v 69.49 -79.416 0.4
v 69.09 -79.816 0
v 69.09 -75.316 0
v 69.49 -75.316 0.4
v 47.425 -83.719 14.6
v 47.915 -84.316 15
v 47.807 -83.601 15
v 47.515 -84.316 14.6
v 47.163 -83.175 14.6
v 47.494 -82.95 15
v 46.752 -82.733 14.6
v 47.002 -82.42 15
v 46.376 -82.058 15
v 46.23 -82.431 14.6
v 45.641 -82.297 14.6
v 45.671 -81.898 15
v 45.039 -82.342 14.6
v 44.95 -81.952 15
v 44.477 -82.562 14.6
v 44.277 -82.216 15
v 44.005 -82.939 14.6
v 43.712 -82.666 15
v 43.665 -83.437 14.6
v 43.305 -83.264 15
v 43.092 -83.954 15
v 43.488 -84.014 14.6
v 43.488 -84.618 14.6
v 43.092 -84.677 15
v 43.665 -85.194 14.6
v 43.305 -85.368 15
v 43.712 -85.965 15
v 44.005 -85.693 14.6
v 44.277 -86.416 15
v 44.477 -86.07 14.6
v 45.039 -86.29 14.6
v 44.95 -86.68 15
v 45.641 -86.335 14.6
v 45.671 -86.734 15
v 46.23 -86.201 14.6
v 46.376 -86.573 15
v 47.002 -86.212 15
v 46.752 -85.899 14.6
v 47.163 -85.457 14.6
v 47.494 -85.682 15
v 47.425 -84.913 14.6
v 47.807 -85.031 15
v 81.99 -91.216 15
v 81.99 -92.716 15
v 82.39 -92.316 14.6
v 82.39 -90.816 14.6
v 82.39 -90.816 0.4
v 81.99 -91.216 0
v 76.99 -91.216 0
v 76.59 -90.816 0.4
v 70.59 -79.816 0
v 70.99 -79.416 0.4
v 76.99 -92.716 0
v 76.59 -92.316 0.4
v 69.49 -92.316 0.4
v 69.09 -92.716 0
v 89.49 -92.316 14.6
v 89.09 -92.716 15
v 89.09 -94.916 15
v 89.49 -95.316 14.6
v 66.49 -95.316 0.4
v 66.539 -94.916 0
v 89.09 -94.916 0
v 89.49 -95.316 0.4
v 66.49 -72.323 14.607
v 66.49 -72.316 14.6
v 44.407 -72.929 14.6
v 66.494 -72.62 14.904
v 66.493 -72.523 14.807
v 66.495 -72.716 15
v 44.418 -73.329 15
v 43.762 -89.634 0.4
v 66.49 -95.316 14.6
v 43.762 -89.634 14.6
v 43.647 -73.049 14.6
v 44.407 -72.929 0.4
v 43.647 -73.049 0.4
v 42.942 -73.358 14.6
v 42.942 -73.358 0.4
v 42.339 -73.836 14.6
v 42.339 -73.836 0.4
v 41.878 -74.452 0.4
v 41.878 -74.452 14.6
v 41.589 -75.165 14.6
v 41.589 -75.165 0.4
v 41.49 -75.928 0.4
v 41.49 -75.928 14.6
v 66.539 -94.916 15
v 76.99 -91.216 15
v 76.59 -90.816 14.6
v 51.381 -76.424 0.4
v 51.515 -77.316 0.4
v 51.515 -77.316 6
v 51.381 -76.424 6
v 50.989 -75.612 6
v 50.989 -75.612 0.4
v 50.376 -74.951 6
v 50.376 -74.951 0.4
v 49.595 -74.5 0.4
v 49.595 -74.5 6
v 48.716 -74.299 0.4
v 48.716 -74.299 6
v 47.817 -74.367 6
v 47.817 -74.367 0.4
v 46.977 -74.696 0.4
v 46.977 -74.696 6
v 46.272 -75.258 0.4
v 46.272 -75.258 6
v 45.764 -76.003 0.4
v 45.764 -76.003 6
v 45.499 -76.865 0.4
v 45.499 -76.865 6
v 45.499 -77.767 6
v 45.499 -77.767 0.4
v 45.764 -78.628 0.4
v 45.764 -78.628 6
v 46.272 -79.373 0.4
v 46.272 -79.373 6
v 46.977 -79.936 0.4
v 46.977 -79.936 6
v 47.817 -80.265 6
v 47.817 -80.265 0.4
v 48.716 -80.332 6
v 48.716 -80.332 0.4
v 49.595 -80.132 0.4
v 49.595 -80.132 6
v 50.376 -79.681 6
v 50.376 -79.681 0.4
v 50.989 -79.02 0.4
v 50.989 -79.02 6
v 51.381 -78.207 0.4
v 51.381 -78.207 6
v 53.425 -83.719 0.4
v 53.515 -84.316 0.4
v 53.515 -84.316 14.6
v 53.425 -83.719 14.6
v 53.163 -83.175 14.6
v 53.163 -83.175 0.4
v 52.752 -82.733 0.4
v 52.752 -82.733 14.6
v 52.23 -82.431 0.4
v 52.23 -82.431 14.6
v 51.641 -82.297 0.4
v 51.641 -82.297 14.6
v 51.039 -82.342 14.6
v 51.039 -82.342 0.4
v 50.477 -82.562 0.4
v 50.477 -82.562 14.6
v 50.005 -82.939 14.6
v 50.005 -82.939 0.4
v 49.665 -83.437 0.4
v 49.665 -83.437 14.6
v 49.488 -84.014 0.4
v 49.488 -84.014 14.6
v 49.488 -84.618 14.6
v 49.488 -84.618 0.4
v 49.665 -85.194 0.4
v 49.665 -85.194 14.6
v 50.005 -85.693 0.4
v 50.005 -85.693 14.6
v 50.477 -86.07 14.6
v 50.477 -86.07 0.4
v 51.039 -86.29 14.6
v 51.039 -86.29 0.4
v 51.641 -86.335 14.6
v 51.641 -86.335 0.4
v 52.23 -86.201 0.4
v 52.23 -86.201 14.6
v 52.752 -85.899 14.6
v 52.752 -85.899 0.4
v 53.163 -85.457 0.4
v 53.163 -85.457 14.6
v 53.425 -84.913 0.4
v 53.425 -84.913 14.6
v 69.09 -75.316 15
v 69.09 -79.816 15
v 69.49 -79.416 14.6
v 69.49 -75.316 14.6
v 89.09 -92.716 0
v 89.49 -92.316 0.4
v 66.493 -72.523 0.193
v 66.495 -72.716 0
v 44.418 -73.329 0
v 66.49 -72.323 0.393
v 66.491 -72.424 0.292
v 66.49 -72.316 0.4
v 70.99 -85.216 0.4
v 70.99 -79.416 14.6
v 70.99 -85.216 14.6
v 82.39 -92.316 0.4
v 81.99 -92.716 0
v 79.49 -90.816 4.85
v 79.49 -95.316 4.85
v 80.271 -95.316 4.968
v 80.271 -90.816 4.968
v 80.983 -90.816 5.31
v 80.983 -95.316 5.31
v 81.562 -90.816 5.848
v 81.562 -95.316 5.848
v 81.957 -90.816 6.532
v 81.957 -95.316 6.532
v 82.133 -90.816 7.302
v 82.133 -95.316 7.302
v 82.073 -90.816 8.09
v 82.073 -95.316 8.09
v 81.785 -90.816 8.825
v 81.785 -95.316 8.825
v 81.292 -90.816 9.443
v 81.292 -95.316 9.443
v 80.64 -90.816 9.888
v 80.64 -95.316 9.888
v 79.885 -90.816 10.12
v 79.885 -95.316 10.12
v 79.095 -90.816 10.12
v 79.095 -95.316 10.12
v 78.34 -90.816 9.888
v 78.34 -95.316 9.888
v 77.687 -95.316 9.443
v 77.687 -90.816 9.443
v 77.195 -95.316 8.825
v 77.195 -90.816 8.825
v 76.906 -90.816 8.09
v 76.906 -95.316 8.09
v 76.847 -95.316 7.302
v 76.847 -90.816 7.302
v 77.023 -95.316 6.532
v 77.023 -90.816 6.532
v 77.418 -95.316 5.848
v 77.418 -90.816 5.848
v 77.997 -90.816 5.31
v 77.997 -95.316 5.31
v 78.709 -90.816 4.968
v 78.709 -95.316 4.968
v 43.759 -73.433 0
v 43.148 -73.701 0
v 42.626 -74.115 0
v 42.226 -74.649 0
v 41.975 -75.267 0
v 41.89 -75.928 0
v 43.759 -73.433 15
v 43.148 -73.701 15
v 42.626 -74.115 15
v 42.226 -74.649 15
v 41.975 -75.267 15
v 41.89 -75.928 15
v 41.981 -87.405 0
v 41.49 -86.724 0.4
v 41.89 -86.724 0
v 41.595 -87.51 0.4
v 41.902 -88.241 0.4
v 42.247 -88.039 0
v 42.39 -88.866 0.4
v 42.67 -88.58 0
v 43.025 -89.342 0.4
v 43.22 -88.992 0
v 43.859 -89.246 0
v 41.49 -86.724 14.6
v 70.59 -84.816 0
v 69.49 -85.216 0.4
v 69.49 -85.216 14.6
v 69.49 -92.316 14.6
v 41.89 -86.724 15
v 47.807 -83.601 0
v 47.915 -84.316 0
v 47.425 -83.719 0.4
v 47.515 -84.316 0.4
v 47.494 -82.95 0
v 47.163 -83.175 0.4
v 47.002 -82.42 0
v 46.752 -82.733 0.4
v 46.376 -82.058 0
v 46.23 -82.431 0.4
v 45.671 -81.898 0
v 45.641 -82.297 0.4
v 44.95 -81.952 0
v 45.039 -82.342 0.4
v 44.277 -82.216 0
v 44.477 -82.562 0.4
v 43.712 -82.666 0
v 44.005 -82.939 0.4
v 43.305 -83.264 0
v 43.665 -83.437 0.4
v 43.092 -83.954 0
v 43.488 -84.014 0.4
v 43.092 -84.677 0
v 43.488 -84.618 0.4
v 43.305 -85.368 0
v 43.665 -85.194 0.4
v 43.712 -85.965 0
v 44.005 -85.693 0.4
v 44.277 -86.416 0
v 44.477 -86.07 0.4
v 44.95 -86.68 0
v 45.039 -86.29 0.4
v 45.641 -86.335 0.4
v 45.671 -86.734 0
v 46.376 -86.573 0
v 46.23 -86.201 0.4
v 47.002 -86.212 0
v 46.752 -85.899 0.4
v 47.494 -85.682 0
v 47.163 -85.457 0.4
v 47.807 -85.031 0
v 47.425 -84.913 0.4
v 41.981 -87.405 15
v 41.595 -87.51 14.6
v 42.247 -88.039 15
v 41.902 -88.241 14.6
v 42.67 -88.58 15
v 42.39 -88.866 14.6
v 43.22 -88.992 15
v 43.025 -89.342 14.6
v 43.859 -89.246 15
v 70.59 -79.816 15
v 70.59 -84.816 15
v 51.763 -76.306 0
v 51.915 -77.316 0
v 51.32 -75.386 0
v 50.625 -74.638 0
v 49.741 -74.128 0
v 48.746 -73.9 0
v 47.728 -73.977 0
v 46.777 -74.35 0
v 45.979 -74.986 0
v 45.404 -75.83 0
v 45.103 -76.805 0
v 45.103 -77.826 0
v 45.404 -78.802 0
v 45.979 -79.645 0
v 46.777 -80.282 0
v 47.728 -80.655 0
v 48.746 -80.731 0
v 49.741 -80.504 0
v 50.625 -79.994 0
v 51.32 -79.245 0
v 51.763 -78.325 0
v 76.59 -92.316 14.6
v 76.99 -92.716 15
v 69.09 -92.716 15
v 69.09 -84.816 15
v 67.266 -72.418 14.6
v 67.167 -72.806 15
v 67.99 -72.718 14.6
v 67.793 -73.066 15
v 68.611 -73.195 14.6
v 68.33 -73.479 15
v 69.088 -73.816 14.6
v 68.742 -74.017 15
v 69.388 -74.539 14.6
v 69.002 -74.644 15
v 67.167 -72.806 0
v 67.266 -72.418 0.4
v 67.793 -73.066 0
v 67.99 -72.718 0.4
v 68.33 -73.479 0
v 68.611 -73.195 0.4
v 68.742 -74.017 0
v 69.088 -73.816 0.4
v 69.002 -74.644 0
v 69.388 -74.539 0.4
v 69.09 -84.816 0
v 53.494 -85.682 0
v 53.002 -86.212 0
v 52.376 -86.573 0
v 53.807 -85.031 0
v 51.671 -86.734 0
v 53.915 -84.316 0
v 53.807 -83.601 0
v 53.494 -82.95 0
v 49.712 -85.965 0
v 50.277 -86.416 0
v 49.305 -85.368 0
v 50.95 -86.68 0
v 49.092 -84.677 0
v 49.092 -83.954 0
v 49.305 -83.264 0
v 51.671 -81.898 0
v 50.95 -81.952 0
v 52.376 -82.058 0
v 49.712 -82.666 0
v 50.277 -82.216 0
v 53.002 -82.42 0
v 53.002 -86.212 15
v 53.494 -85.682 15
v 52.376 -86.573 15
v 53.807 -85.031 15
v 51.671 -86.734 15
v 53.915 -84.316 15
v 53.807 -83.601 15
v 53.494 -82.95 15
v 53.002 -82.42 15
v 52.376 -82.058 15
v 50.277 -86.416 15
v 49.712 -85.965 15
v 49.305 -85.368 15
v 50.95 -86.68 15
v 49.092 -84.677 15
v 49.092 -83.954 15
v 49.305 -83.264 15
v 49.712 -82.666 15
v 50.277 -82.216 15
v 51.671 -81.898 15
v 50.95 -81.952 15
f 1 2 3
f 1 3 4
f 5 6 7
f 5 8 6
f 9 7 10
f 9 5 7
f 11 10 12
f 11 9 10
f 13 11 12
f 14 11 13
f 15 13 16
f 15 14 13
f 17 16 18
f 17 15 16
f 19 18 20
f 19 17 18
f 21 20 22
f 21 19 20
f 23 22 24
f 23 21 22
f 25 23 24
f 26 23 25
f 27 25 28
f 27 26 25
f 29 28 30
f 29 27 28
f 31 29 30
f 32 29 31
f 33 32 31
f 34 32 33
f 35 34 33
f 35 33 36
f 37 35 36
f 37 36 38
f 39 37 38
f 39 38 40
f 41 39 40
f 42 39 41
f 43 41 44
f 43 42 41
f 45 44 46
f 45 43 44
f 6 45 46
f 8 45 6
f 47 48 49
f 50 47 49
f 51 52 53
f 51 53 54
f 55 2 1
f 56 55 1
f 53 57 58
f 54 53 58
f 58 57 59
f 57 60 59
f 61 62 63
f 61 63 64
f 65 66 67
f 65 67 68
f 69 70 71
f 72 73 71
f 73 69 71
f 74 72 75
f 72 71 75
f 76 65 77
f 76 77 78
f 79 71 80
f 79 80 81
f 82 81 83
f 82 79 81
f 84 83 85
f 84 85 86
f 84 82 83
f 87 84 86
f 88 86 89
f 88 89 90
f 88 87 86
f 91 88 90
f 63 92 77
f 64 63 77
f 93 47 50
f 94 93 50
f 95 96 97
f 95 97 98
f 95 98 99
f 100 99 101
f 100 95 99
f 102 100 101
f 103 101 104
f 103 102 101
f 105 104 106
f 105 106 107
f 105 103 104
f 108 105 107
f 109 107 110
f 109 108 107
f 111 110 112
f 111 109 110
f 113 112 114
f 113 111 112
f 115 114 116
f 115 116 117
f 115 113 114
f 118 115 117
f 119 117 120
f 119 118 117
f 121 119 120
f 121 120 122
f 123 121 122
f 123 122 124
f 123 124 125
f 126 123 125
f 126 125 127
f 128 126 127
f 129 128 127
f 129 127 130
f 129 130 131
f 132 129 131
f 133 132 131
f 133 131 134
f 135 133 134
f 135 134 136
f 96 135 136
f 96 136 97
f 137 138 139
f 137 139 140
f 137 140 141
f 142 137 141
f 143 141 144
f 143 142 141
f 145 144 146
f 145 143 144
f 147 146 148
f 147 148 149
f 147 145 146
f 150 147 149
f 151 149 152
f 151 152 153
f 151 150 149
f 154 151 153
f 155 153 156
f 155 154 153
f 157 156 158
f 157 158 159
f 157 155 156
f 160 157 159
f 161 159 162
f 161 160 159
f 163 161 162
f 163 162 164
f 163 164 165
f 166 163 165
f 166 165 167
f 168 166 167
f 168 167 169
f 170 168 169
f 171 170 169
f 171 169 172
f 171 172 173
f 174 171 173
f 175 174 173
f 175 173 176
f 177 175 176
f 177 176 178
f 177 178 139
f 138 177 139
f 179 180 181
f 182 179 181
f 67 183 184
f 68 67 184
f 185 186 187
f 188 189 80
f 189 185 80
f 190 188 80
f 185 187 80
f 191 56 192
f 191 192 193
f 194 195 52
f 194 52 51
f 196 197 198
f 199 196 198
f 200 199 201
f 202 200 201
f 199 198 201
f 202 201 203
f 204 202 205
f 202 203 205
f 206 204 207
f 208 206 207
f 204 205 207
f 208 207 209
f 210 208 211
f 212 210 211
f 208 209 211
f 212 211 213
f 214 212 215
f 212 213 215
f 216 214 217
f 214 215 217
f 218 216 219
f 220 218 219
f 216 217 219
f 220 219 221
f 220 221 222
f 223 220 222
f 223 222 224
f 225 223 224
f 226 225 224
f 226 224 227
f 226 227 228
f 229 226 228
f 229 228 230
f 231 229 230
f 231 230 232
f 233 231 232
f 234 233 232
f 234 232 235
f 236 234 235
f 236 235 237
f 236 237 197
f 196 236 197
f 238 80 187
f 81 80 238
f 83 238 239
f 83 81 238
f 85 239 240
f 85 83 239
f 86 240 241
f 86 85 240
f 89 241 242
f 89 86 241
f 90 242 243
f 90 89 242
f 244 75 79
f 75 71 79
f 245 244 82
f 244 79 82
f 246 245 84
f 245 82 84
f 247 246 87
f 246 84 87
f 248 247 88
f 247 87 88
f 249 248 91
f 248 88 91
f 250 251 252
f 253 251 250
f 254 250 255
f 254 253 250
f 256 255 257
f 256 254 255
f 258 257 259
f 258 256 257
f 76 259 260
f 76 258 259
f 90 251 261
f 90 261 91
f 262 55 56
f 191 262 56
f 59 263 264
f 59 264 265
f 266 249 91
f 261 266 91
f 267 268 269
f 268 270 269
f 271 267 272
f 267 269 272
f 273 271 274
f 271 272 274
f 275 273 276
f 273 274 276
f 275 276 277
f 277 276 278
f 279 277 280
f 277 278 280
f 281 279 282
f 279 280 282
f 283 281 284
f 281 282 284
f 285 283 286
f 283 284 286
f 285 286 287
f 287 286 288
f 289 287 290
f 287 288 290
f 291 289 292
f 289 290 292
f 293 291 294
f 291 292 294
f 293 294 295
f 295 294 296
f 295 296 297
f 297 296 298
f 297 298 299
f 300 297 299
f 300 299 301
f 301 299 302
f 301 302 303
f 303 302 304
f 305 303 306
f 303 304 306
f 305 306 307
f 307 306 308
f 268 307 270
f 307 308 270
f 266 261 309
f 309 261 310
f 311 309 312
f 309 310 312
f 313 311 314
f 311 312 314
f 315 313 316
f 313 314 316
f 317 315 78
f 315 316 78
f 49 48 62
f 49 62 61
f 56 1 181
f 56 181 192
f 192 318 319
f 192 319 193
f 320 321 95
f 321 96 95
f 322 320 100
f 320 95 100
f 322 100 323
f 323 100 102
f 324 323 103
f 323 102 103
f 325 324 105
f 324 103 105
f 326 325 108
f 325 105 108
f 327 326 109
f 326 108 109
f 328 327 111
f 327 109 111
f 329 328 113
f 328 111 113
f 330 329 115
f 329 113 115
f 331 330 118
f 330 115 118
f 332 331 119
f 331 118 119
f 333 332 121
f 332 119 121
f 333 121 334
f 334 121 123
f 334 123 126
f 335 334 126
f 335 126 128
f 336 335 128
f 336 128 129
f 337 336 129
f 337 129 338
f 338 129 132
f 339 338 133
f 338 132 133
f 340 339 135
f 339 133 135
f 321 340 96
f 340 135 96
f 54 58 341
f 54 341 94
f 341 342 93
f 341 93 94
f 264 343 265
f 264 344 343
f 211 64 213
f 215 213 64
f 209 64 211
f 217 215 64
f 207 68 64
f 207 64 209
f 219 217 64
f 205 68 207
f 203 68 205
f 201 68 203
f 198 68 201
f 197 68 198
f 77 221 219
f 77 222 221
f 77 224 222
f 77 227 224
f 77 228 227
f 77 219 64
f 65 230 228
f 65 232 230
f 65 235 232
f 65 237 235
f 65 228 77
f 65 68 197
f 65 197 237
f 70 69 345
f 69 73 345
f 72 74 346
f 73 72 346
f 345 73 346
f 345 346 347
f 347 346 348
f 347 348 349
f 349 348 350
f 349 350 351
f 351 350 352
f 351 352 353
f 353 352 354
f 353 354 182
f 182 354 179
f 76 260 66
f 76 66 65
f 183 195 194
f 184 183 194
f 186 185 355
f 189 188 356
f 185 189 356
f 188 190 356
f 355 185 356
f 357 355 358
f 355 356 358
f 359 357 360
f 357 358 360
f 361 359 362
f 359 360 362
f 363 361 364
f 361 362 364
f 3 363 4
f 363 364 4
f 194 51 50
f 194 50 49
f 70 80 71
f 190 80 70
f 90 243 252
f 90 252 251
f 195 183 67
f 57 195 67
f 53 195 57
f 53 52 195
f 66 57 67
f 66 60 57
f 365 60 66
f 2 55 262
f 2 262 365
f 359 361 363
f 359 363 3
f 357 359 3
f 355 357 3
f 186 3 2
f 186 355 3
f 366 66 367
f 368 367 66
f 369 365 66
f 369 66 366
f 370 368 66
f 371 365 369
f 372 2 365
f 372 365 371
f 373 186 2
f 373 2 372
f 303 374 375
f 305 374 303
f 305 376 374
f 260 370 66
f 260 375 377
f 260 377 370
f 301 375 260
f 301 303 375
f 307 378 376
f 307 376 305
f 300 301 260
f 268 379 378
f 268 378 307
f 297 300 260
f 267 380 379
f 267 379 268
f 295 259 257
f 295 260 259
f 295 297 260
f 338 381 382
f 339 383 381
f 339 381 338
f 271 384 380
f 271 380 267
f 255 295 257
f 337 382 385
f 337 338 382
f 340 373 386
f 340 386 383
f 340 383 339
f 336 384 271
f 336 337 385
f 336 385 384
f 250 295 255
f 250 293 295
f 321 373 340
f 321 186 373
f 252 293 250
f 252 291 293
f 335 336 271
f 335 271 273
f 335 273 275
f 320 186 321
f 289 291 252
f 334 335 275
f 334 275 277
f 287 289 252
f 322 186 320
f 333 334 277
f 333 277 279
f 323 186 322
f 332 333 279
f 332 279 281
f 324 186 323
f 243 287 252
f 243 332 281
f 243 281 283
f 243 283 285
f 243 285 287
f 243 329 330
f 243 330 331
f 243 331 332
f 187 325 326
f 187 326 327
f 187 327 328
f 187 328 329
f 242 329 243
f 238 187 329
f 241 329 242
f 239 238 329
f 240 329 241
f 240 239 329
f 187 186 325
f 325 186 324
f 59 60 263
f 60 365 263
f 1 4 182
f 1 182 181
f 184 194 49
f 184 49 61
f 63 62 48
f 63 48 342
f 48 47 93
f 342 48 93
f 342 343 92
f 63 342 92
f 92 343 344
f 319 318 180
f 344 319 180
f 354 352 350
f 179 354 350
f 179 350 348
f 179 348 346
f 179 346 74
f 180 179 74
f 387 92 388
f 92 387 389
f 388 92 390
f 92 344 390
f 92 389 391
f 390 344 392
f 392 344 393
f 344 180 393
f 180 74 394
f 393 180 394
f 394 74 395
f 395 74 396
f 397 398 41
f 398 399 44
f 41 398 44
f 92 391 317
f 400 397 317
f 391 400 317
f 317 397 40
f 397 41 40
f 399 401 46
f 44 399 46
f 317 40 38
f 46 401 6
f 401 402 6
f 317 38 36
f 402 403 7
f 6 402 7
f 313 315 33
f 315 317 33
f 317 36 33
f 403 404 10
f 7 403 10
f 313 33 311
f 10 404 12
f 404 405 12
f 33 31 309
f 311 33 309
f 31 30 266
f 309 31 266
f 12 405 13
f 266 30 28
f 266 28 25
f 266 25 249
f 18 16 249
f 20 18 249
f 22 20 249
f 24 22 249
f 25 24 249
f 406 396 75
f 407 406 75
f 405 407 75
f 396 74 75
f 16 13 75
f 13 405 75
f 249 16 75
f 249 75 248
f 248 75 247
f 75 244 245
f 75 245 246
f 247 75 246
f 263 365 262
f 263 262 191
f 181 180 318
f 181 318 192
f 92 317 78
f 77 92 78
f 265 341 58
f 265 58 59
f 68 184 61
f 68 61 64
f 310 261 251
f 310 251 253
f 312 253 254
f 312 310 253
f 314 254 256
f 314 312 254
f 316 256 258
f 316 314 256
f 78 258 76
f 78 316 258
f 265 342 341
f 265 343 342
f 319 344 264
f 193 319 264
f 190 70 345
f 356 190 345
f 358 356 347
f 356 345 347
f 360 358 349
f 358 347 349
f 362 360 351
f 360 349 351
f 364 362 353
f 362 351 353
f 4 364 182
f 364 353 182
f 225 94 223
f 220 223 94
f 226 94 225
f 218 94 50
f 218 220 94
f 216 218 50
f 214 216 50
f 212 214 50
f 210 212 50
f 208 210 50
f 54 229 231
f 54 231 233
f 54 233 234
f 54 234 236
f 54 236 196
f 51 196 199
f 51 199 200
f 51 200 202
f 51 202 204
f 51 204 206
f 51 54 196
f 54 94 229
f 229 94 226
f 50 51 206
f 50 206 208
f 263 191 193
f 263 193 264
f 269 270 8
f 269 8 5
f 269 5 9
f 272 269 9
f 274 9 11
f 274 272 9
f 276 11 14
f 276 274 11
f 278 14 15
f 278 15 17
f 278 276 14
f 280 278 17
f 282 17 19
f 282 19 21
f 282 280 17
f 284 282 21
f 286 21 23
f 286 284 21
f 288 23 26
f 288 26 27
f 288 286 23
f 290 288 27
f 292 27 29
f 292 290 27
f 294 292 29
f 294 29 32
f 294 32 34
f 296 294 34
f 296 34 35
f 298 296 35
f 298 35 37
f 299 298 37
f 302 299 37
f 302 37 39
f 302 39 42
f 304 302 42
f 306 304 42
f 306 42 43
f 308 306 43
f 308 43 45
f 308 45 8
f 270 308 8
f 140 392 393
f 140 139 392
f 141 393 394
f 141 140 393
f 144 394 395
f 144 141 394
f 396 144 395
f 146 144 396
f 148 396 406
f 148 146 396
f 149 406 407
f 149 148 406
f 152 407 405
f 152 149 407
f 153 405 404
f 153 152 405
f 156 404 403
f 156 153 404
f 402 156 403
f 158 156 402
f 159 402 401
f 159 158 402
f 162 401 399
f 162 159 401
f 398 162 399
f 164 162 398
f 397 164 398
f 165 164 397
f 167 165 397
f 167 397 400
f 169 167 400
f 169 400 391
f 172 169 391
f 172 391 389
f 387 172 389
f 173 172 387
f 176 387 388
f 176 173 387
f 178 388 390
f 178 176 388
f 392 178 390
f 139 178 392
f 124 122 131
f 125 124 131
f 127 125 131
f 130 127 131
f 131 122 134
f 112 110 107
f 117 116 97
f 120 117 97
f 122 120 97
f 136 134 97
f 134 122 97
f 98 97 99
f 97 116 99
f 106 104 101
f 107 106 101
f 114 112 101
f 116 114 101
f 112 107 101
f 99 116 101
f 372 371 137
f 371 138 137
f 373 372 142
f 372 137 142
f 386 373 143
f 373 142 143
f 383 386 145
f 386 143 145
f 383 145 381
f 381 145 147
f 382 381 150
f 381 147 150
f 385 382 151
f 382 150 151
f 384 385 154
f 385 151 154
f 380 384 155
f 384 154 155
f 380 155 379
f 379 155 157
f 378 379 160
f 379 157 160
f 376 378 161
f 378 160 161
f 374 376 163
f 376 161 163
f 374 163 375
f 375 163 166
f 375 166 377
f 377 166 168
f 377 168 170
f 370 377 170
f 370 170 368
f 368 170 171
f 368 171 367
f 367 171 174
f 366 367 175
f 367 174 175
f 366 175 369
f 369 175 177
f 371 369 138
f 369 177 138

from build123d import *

# Parameters (mm, degrees)
SKETCH1_R           = 3.025
SKETCH1_R_2         = 2.025
BOSS_EXTRUDE1_DEPTH = 15
BOSS_EXTRUDE2_START = 6
SKETCH1_2_R         = 3.025
BOSS_EXTRUDE2_DEPTH = 9
SKETCH2_R           = 2.65
CUT_EXTRUDE1_DEPTH  = 70
FILLET1_R           = 3
CHAMFER1_SIZE       = 0.4


# Some blends are built 0.0001 mm under size
with BuildPart() as part:
    # Sketch1 → Boss-Extrude1 (new body)
    with BuildSketch(Plane.XY):
        Polygon((66.489922843, -72.31585339), (69.489922843, -72.31585339), (69.489922843, -79.41585339), (70.989922843, -79.41585339), (70.989922843, -85.21585339), (69.489922843, -85.21585339), (69.489922843, -92.31585339), (76.589922843, -92.31585339), (76.589922843, -90.81585339), (82.389922843, -90.81585339), (82.389922843, -92.31585339), (89.489922843, -92.31585339), (89.489922843, -95.31585339), (66.489922843, -95.31585339), (41.489922843, -89.06585339), (41.489922843, -73.010297834), align=None)
        with Locations((48.489922843, -77.31585339)):
            Circle(SKETCH1_R, mode=Mode.SUBTRACT)
        with Locations((45.489922843, -84.31585339)):
            Circle(SKETCH1_R_2, mode=Mode.SUBTRACT)
        with Locations((51.489922843, -84.31585339)):
            Circle(SKETCH1_R_2, mode=Mode.SUBTRACT)
    extrude(amount=BOSS_EXTRUDE1_DEPTH)

    # Sketch1<2> → Boss-Extrude2 (add)
    with BuildSketch(Plane.XY.offset(BOSS_EXTRUDE2_START)):
        with Locations((48.489922843, -77.31585339)):
            Circle(SKETCH1_2_R)
    extrude(amount=BOSS_EXTRUDE2_DEPTH)

    # Sketch2 → Cut-Extrude1 (cut)
    with BuildSketch(Plane.XZ.offset(95.31585339)):
        with Locations(Location((79.489922843, 7.5, 0), (0, 0, 270))):
            Circle(SKETCH2_R)
    extrude(amount=-CUT_EXTRUDE1_DEPTH, mode=Mode.SUBTRACT)

    # Fillet1
    fillet1_edges = [part.edges().sort_by_distance(p)[0] for p in [
        (69.489922843, -72.31585339, 7.5),
        (41.489922843, -73.010297834, 7.5),
        (41.489922843, -89.06585339, 7.5),
    ]]
    fillet(fillet1_edges, radius=FILLET1_R - 0.0001)  # a hair under: the kernel refuses the full size

    # Chamfer1
    # the kernel refuses this chamfer: 0.4 mm, written as the material it takes off along each edge
    with BuildSketch(Plane(origin=(69.489922843, -75.31575339, 0), x_dir=(-0.9996219169112966, 2.140826135148345e-13, -0.027495876610585536), z_dir=(0, -1, 0))) as chamfer1_piece_1:
        Polygon((CHAMFER1_SIZE * 0.999621916911, -CHAMFER1_SIZE * 0.0274958766106), (-CHAMFER1_SIZE * 0.0274958766106, -CHAMFER1_SIZE * 0.999621916911), (0, 0), align=None)
    extrude(amount=4.1001, mode=Mode.SUBTRACT)
    with BuildSketch(Plane(origin=(69.489922843, -79.41585339, 0), x_dir=(0, -0.9996219169112966, -0.027495876610585536), z_dir=(1, 0, 0)), Plane(origin=(72.018596038, -85.21585339, 0), x_dir=(0, 0.9996219169112966, -0.027495876610585536), z_dir=(-1, 0, 0)), Plane(origin=(76.589922843, -92.31585339, 0), x_dir=(0.9996219169112966, 0, -0.027495876610585536), z_dir=(0, 1, 0)), Plane(origin=(82.389922843, -89.787180195, 0), x_dir=(-0.9996219169112966, 0, -0.027495876610585536), z_dir=(0, -1, 0))) as chamfer1_piece_2:
        Polygon((CHAMFER1_SIZE * 0.999621916911, -CHAMFER1_SIZE * 0.0274958766106), (-CHAMFER1_SIZE * 0.0274958766106, -CHAMFER1_SIZE * 0.999621916911), (0, 0), align=None)
    extrude(amount=2.528673195, mode=Mode.SUBTRACT)
    with BuildSketch(Plane(origin=(90.518596038, -95.31585339, 15), x_dir=(0, 0.9996219169112966, 0.02749587661058671), z_dir=(-1, 0, 0))) as chamfer1_piece_3:
        Polygon((CHAMFER1_SIZE * 0.999621916911, CHAMFER1_SIZE * 0.0274958766106), (-CHAMFER1_SIZE * 0.0274958766106, CHAMFER1_SIZE * 0.999621916911), (0, 0), align=None)
    extrude(amount=25.05734639, mode=Mode.SUBTRACT)
    with BuildSketch(Plane(origin=(70.989922843, -78.387180195, 0), x_dir=(-0.9996219169112966, -2.6206664757850423e-13, -0.027495876610585536), z_dir=(0, -1, 0)), Plane(origin=(75.561249648, -90.81585339, 0), x_dir=(0, -0.9996219169112966, -0.027495876610585536), z_dir=(1, 0, 0))) as chamfer1_piece_4:
        Polygon((CHAMFER1_SIZE * 0.999621916911, -CHAMFER1_SIZE * 0.0274958766106), (-CHAMFER1_SIZE * 0.0274958766106, -CHAMFER1_SIZE * 0.999621916911), (0, 0), align=None)
    extrude(amount=7.85734639, mode=Mode.SUBTRACT)
    with BuildSketch(Plane(origin=(69.489922843, -85.21585339, 0), x_dir=(-0.9996219169112966, -2.1408261351483406e-13, -0.027495876610585536), z_dir=(0, -1, 0)), Plane(origin=(69.489922843, -92.31585339, 0), x_dir=(0, -0.9996219169112966, -0.027495876610585536), z_dir=(1, 0, 0))) as chamfer1_piece_5:
        Polygon((CHAMFER1_SIZE * 0.999621916911, -CHAMFER1_SIZE * 0.0274958766106), (-CHAMFER1_SIZE * 0.0274958766106, -CHAMFER1_SIZE * 0.999621916911), (0, 0), align=None)
    extrude(amount=7.1, mode=Mode.SUBTRACT)
    with BuildSketch(Plane(origin=(82.389922843, -92.31585339, 0), x_dir=(0, -0.9996219169112966, -0.027495876610585536), z_dir=(1, 0, 0))) as chamfer1_piece_6:
        Polygon((CHAMFER1_SIZE * 0.999621916911, -CHAMFER1_SIZE * 0.0274958766106), (-CHAMFER1_SIZE * 0.0274958766106, -CHAMFER1_SIZE * 0.999621916911), (0, 0), align=None)
    extrude(amount=8.128673195, mode=Mode.SUBTRACT)
    with BuildSketch(Plane(origin=(89.489922843, -91.287180195, 0), x_dir=(-0.9996219169112966, 0, -0.027495876610585536), z_dir=(0, -1, 0))) as chamfer1_piece_7:
        Polygon((CHAMFER1_SIZE * 0.999621916911, -CHAMFER1_SIZE * 0.0274958766106), (-CHAMFER1_SIZE * 0.0274958766106, -CHAMFER1_SIZE * 0.999621916911), (0, 0), align=None)
    extrude(amount=5.05734639, mode=Mode.SUBTRACT)
    with BuildSketch(Plane(origin=(90.518596038, -95.31585339, 0), x_dir=(0, 0.9996219169112966, -0.027495876610585536), z_dir=(-1, 0, 0))) as chamfer1_piece_8:
        Polygon((CHAMFER1_SIZE * 0.999621916911, -CHAMFER1_SIZE * 0.0274958766106), (-CHAMFER1_SIZE * 0.0274958766106, -CHAMFER1_SIZE * 0.999621916911), (0, 0), align=None)
    extrude(amount=25.05734639, mode=Mode.SUBTRACT)
    with BuildSketch(Plane(origin=(89.489922843, -91.287180195, 15), x_dir=(-0.9996219169112966, 0, 0.02749587661058671), z_dir=(0, -1, 0))) as chamfer1_piece_9:
        Polygon((CHAMFER1_SIZE * 0.999621916911, CHAMFER1_SIZE * 0.0274958766106), (-CHAMFER1_SIZE * 0.0274958766106, CHAMFER1_SIZE * 0.999621916911), (0, 0), align=None)
    extrude(amount=5.05734639, mode=Mode.SUBTRACT)
    with BuildSketch(Plane(origin=(44.406524418, -72.929281124, 0), x_dir=(0.02775656898180667, -0.9992364833450456, -0.027495876610586712), z_dir=(0.9996144206527183, 0.027767067240353136, 0)), Plane(origin=(44.406524418, -72.929281124, 15), x_dir=(-0.0007634798546782339, 0.027485274768416574, -0.9996219169112971), z_dir=(0.9996144206527183, 0.027767067240353136, 0))) as chamfer1_piece_10:
        Polygon((CHAMFER1_SIZE * 0.999621916911, -CHAMFER1_SIZE * 0.0274958766106), (-CHAMFER1_SIZE * 0.0274958766106, -CHAMFER1_SIZE * 0.999621916911), (0, 0), align=None)
    extrude(amount=23.120589807, mode=Mode.SUBTRACT)
    with BuildSketch(Plane(origin=(82.389922843, -92.31585339, 15), x_dir=(0, -0.9996219169112966, 0.02749587661058671), z_dir=(1, 0, 0))) as chamfer1_piece_11:
        Polygon((CHAMFER1_SIZE * 0.999621916911, CHAMFER1_SIZE * 0.0274958766106), (-CHAMFER1_SIZE * 0.0274958766106, CHAMFER1_SIZE * 0.999621916911), (0, 0), align=None)
    extrude(amount=8.128673195, mode=Mode.SUBTRACT)
    with BuildSketch(Plane(origin=(82.389922843, -89.787180195, 15), x_dir=(-0.9996219169112966, 0, 0.02749587661058671), z_dir=(0, -1, 0)), Plane(origin=(76.589922843, -92.31585339, 15), x_dir=(0.9996219169112966, 0, 0.02749587661058671), z_dir=(0, 1, 0)), Plane(origin=(72.018596038, -85.21585339, 15), x_dir=(0, 0.9996219169112966, 0.02749587661058671), z_dir=(-1, 0, 0)), Plane(origin=(69.489922843, -79.41585339, 15), x_dir=(0, -0.9996219169112966, 0.02749587661058671), z_dir=(1, 0, 0))) as chamfer1_piece_12:
        Polygon((CHAMFER1_SIZE * 0.999621916911, CHAMFER1_SIZE * 0.0274958766106), (-CHAMFER1_SIZE * 0.0274958766106, CHAMFER1_SIZE * 0.999621916911), (0, 0), align=None)
    extrude(amount=2.528673195, mode=Mode.SUBTRACT)
    with BuildSketch(Plane(origin=(75.561249648, -90.81585339, 15), x_dir=(0, -0.9996219169112966, 0.02749587661058671), z_dir=(1, 0, 0)), Plane(origin=(70.989922843, -78.387180195, 15), x_dir=(-0.9996219169112966, -2.6206664757850423e-13, 0.02749587661058671), z_dir=(0, -1, 0))) as chamfer1_piece_13:
        Polygon((CHAMFER1_SIZE * 0.999621916911, CHAMFER1_SIZE * 0.0274958766106), (-CHAMFER1_SIZE * 0.0274958766106, CHAMFER1_SIZE * 0.999621916911), (0, 0), align=None)
    extrude(amount=7.85734639, mode=Mode.SUBTRACT)
    with BuildSketch(Plane(origin=(48.489922843, -77.31585339, 0), x_dir=(1, 0, 0), z_dir=(0, -1, 0))) as chamfer1_piece_14:
        Polygon((3.025 + CHAMFER1_SIZE, 0), (3.025, CHAMFER1_SIZE), (3.025, 0), align=None)
    revolve(axis=Axis((48.489922843, -77.31585339, 0), (0, 0, 1)), mode=Mode.SUBTRACT)
    with BuildSketch(Plane(origin=(69.489922843, -92.31585339, 15), x_dir=(0, -0.9996219169112966, 0.02749587661058671), z_dir=(1, 0, 0)), Plane(origin=(69.489922843, -85.21585339, 15), x_dir=(-0.9996219169112966, -2.1408261351483406e-13, 0.02749587661058671), z_dir=(0, -1, 0))) as chamfer1_piece_15:
        Polygon((CHAMFER1_SIZE * 0.999621916911, CHAMFER1_SIZE * 0.0274958766106), (-CHAMFER1_SIZE * 0.0274958766106, CHAMFER1_SIZE * 0.999621916911), (0, 0), align=None)
    extrude(amount=7.1, mode=Mode.SUBTRACT)
    with BuildSketch(Plane(origin=(45.489922843, -84.31585339, 0), x_dir=(1, 0, 0), z_dir=(0, -1, 0))) as chamfer1_piece_16:
        Polygon((2.025 + CHAMFER1_SIZE, 0), (2.025, CHAMFER1_SIZE), (2.025, 0), align=None)
    revolve(axis=Axis((45.489922843, -84.31585339, 0), (0, 0, 1)), mode=Mode.SUBTRACT)
    with BuildSketch(Plane(origin=(45.489922843, -84.31585339, 15), x_dir=(1, 0, 0), z_dir=(0, -1, 0))) as chamfer1_piece_17:
        Polygon((2.025 + CHAMFER1_SIZE, 0), (2.025, -CHAMFER1_SIZE), (2.025, 0), align=None)
    revolve(axis=Axis((45.489922843, -84.31585339, 15), (0, 0, 1)), mode=Mode.SUBTRACT)
    with BuildSketch(Plane(origin=(51.489922843, -84.31585339, 0), x_dir=(1, 0, 0), z_dir=(0, -1, 0))) as chamfer1_piece_18:
        Polygon((2.025 + CHAMFER1_SIZE, 0), (2.025, CHAMFER1_SIZE), (2.025, 0), align=None)
    revolve(axis=Axis((51.489922843, -84.31585339, 0), (0, 0, 1)), mode=Mode.SUBTRACT)
    with BuildSketch(Plane(origin=(51.489922843, -84.31585339, 15), x_dir=(1, 0, 0), z_dir=(0, -1, 0))) as chamfer1_piece_19:
        Polygon((2.025 + CHAMFER1_SIZE, 0), (2.025, -CHAMFER1_SIZE), (2.025, 0), align=None)
    revolve(axis=Axis((51.489922843, -84.31585339, 15), (0, 0, 1)), mode=Mode.SUBTRACT)
    with BuildSketch(Plane(origin=(69.489922843, -75.31575339, 15), x_dir=(-0.9996219169112966, 2.140826135148345e-13, 0.02749587661058671), z_dir=(0, -1, 0))) as chamfer1_piece_20:
        Polygon((CHAMFER1_SIZE * 0.999621916911, CHAMFER1_SIZE * 0.0274958766106), (-CHAMFER1_SIZE * 0.0274958766106, CHAMFER1_SIZE * 0.999621916911), (0, 0), align=None)
    extrude(amount=4.1001, mode=Mode.SUBTRACT)
    with BuildSketch(Plane(origin=(67.487882428, -95.565343286, 0), x_dir=(0.2424439264180973, 0.969775705672395, -0.02749587661058577), z_dir=(-0.9701425001453322, 0.2425356250363316, 0))) as chamfer1_piece_21:
        Polygon((CHAMFER1_SIZE * 0.999621916911, -CHAMFER1_SIZE * 0.0274958766106), (-CHAMFER1_SIZE * 0.0274958766106, -CHAMFER1_SIZE * 0.999621916911), (0, 0), align=None)
    extrude(amount=24.455832214, mode=Mode.SUBTRACT)
    with BuildSketch(Plane(origin=(41.489922843, -86.723602248, 0), x_dir=(0.9996219169112968, 0, -0.02749587661058673), z_dir=(0, 1, 0))) as chamfer1_piece_22:
        Polygon((CHAMFER1_SIZE * 0.999621916911, -CHAMFER1_SIZE * 0.0274958766106), (-CHAMFER1_SIZE * 0.0274958766106, -CHAMFER1_SIZE * 0.999621916911), (0, 0), align=None)
    extrude(amount=10.795577824, mode=Mode.SUBTRACT)
    with BuildSketch(Plane(origin=(44.489822843, -86.723602248, 0), x_dir=(-1, 0, 0), z_dir=(0, 1, 0))) as chamfer1_piece_23:
        Polygon((2.9999 - CHAMFER1_SIZE, 0), (2.9999, CHAMFER1_SIZE), (2.9999, 0), align=None)
    revolve(axis=Axis((44.489822843, -86.723602248, 0), (0, 0, 1)), revolution_arc=75.963756532, mode=Mode.SUBTRACT)
    with BuildSketch(Plane(origin=(44.489822843, -75.928024424, 0), x_dir=(-0.02776706724035276, 0.9996144206527183, 0), z_dir=(0.9996144206527183, 0.02776706724035276, 0))) as chamfer1_piece_24:
        Polygon((2.9999 - CHAMFER1_SIZE, 0), (2.9999, CHAMFER1_SIZE), (2.9999, 0), align=None)
    revolve(axis=Axis((44.489822843, -75.928024424, 0), (0, 0, 1)), revolution_arc=88.408859729, mode=Mode.SUBTRACT)
    with BuildSketch(Plane(origin=(66.490022843, -75.31575339, 0), x_dir=(0, 1, 0), z_dir=(-1, 0, 0))) as chamfer1_piece_25:
        Polygon((2.9999 - CHAMFER1_SIZE, 0), (2.9999, -CHAMFER1_SIZE), (2.9999, 0), align=None)
    revolve(axis=Axis((66.490022843, -75.31575339, 0), (0, 0, -1)), revolution_arc=90, mode=Mode.SUBTRACT)
    with BuildSketch(Plane(origin=(41.489922843, -86.723602248, 15), x_dir=(0.9996219169112966, 0, 0.027495876610587656), z_dir=(0, 1, 0))) as chamfer1_piece_26:
        Polygon((CHAMFER1_SIZE * 0.999621916911, CHAMFER1_SIZE * 0.0274958766106), (-CHAMFER1_SIZE * 0.0274958766106, CHAMFER1_SIZE * 0.999621916911), (0, 0), align=None)
    extrude(amount=10.795577824, mode=Mode.SUBTRACT)
    with BuildSketch(Plane(origin=(67.487882428, -95.565343286, 15), x_dir=(0.24244392641809726, 0.9697757056723949, 0.027495876610587038), z_dir=(-0.9701425001453322, 0.2425356250363316, 0))) as chamfer1_piece_27:
        Polygon((CHAMFER1_SIZE * 0.999621916911, CHAMFER1_SIZE * 0.0274958766106), (-CHAMFER1_SIZE * 0.0274958766106, CHAMFER1_SIZE * 0.999621916911), (0, 0), align=None)
    extrude(amount=24.455832214, mode=Mode.SUBTRACT)
    with BuildSketch(Plane(origin=(44.489822843, -86.723602248, 15), x_dir=(-1, 0, 0), z_dir=(0, 1, 0))) as chamfer1_piece_28:
        Polygon((2.9999 - CHAMFER1_SIZE, 0), (2.9999, -CHAMFER1_SIZE), (2.9999, 0), align=None)
    revolve(axis=Axis((44.489822843, -86.723602248, 15), (0, 0, 1)), revolution_arc=75.963756532, mode=Mode.SUBTRACT)
    with BuildSketch(Plane(origin=(44.489822843, -75.928024424, 15), x_dir=(-0.02776706724035276, 0.9996144206527183, 0), z_dir=(0.9996144206527183, 0.02776706724035276, 0))) as chamfer1_piece_29:
        Polygon((2.9999 - CHAMFER1_SIZE, 0), (2.9999, -CHAMFER1_SIZE), (2.9999, 0), align=None)
    revolve(axis=Axis((44.489822843, -75.928024424, 15), (0, 0, 1)), revolution_arc=88.408859729, mode=Mode.SUBTRACT)
    with BuildSketch(Plane(origin=(66.490022843, -75.31575339, 15), x_dir=(0, 1, 0), z_dir=(-1, 0, 0))) as chamfer1_piece_30:
        Polygon((2.9999, CHAMFER1_SIZE), (2.9999 - CHAMFER1_SIZE, 0), (2.9999, 0), align=None)
    revolve(axis=Axis((66.490022843, -75.31575339, 15), (0, 0, -1)), revolution_arc=90, mode=Mode.SUBTRACT)
    with BuildSketch(Plane(origin=(65.461249648, -72.31585339, 15), x_dir=(0, 0.027495876610595927, -0.9996219169112964), z_dir=(1, 0, 0))) as chamfer1_piece_31:
        Polygon((CHAMFER1_SIZE * 0.999621916911, -CHAMFER1_SIZE * 0.0274958766106), (-CHAMFER1_SIZE * 0.0274958766106, -CHAMFER1_SIZE * 0.999621916911), (0, 0), align=None)
    extrude(amount=1.028773195, mode=Mode.SUBTRACT)
    with BuildSketch(Plane(origin=(65.461249648, -72.31585339, 0), x_dir=(0, 0.027495876610595986, 0.9996219169112965), z_dir=(1, 0, 0))) as chamfer1_piece_32:
        Polygon((CHAMFER1_SIZE * 0.999621916911, CHAMFER1_SIZE * 0.0274958766106), (-CHAMFER1_SIZE * 0.0274958766106, CHAMFER1_SIZE * 0.999621916911), (0, 0), align=None)
    extrude(amount=1.028773195, mode=Mode.SUBTRACT)
    with BuildSketch(Plane(origin=(69.489922843, -75.31575339, 0), x_dir=(-0.9996219169112966, 2.140826135148345e-13, -0.027495876610585536), z_dir=(0, -1, 0))) as chamfer1_piece_33a_section:
        Polygon((CHAMFER1_SIZE * 0.999621916911, -CHAMFER1_SIZE * 0.0274958766106), (-CHAMFER1_SIZE * 0.0274958766106, -CHAMFER1_SIZE * 0.999621916911), (0, 0), align=None)
    chamfer1_piece_33a = extrude(amount=5.128773195, mode=Mode.PRIVATE)
    chamfer1_piece_33a = split(chamfer1_piece_33a, bisect_by=Plane(origin=(69.358005392, -79.41585339, 0.131917451), z_dir=(0, -1, 0)), keep=Keep.TOP, mode=Mode.PRIVATE)
    with BuildSketch(Plane(origin=(68.461249648, -79.41585339, 0), x_dir=(0, -0.9996219169112966, -0.027495876610585536), z_dir=(1, 0, 0))) as chamfer1_piece_33b_section:
        Polygon((CHAMFER1_SIZE * 0.999621916911, -CHAMFER1_SIZE * 0.0274958766106), (-CHAMFER1_SIZE * 0.0274958766106, -CHAMFER1_SIZE * 0.999621916911), (0, 0), align=None)
    chamfer1_piece_33b = extrude(amount=3.55734639, mode=Mode.PRIVATE)
    chamfer1_piece_33b = split(chamfer1_piece_33b, bisect_by=Plane(origin=(69.489922843, -79.54777084, 0.131917451), z_dir=(-1, 0, 0)), keep=Keep.TOP, mode=Mode.PRIVATE)
    chamfer1_piece_33 = chamfer1_piece_33a & chamfer1_piece_33b
    add(chamfer1_piece_33, mode=Mode.SUBTRACT)
    with BuildSketch(Plane(origin=(72.018596038, -85.21585339, 0), x_dir=(0, 0.9996219169112966, -0.027495876610585536), z_dir=(-1, 0, 0))) as chamfer1_piece_34a_section:
        Polygon((CHAMFER1_SIZE * 0.999621916911, -CHAMFER1_SIZE * 0.0274958766106), (-CHAMFER1_SIZE * 0.0274958766106, -CHAMFER1_SIZE * 0.999621916911), (0, 0), align=None)
    chamfer1_piece_34a = extrude(amount=3.55734639, mode=Mode.PRIVATE)
    chamfer1_piece_34a = split(chamfer1_piece_34a, bisect_by=Plane(origin=(69.489922843, -85.083935939, 0.131917451), z_dir=(-1, 0, 0)), keep=Keep.TOP, mode=Mode.PRIVATE)
    with BuildSketch(Plane(origin=(69.489922843, -84.187180195, 0), x_dir=(-0.9996219169112966, -2.1408261351483406e-13, -0.027495876610585536), z_dir=(0, -1, 0))) as chamfer1_piece_34b_section:
        Polygon((CHAMFER1_SIZE * 0.999621916911, -CHAMFER1_SIZE * 0.0274958766106), (-CHAMFER1_SIZE * 0.0274958766106, -CHAMFER1_SIZE * 0.999621916911), (0, 0), align=None)
    chamfer1_piece_34b = extrude(amount=8.128673195, mode=Mode.PRIVATE)
    chamfer1_piece_34b = split(chamfer1_piece_34b, bisect_by=Plane(origin=(69.358005392, -85.21585339, 0.131917451), z_dir=(0, 1, 0)), keep=Keep.TOP, mode=Mode.PRIVATE)
    chamfer1_piece_34 = chamfer1_piece_34a & chamfer1_piece_34b
    add(chamfer1_piece_34, mode=Mode.SUBTRACT)
    with BuildSketch(Plane(origin=(69.489922843, -85.21585339, 0), x_dir=(-0.9996219169112966, -2.1408261351483406e-13, -0.027495876610585536), z_dir=(0, -1, 0))) as chamfer1_piece_35a_section:
        Polygon((CHAMFER1_SIZE * 0.999621916911, -CHAMFER1_SIZE * 0.0274958766106), (-CHAMFER1_SIZE * 0.0274958766106, -CHAMFER1_SIZE * 0.999621916911), (0, 0), align=None)
    chamfer1_piece_35a = extrude(amount=8.128673195, mode=Mode.PRIVATE)
    chamfer1_piece_35a = split(chamfer1_piece_35a, bisect_by=Plane(origin=(69.358005392, -92.31585339, 0.131917451), z_dir=(0, -1, 0)), keep=Keep.TOP, mode=Mode.PRIVATE)
    with BuildSketch(Plane(origin=(68.461249648, -92.31585339, 0), x_dir=(0, -0.9996219169112966, -0.027495876610585536), z_dir=(1, 0, 0))) as chamfer1_piece_35b_section:
        Polygon((CHAMFER1_SIZE * 0.999621916911, -CHAMFER1_SIZE * 0.0274958766106), (-CHAMFER1_SIZE * 0.0274958766106, -CHAMFER1_SIZE * 0.999621916911), (0, 0), align=None)
    chamfer1_piece_35b = extrude(amount=8.128673195, mode=Mode.PRIVATE)
    chamfer1_piece_35b = split(chamfer1_piece_35b, bisect_by=Plane(origin=(69.489922843, -92.44777084, 0.131917451), z_dir=(-1, 0, 0)), keep=Keep.TOP, mode=Mode.PRIVATE)
    chamfer1_piece_35 = chamfer1_piece_35a & chamfer1_piece_35b
    add(chamfer1_piece_35, mode=Mode.SUBTRACT)
    with BuildSketch(Plane(origin=(69.489922843, -92.31585339, 0), x_dir=(0, -0.9996219169112966, -0.027495876610585536), z_dir=(1, 0, 0))) as chamfer1_piece_36a_section:
        Polygon((CHAMFER1_SIZE * 0.999621916911, -CHAMFER1_SIZE * 0.0274958766106), (-CHAMFER1_SIZE * 0.0274958766106, -CHAMFER1_SIZE * 0.999621916911), (0, 0), align=None)
    chamfer1_piece_36a = extrude(amount=8.128673195, mode=Mode.PRIVATE)
    chamfer1_piece_36a = split(chamfer1_piece_36a, bisect_by=Plane(origin=(76.589922843, -92.44777084, 0.131917451), z_dir=(1, 0, 0)), keep=Keep.TOP, mode=Mode.PRIVATE)
    with BuildSketch(Plane(origin=(76.589922843, -93.344526585, 0), x_dir=(0.9996219169112966, 0, -0.027495876610585536), z_dir=(0, 1, 0))) as chamfer1_piece_36b_section:
        Polygon((CHAMFER1_SIZE * 0.999621916911, -CHAMFER1_SIZE * 0.0274958766106), (-CHAMFER1_SIZE * 0.0274958766106, -CHAMFER1_SIZE * 0.999621916911), (0, 0), align=None)
    chamfer1_piece_36b = extrude(amount=3.55734639, mode=Mode.PRIVATE)
    chamfer1_piece_36b = split(chamfer1_piece_36b, bisect_by=Plane(origin=(76.721840294, -92.31585339, 0.131917451), z_dir=(0, -1, 0)), keep=Keep.TOP, mode=Mode.PRIVATE)
    chamfer1_piece_36 = chamfer1_piece_36a & chamfer1_piece_36b
    add(chamfer1_piece_36, mode=Mode.SUBTRACT)
    with BuildSketch(Plane(origin=(81.361249648, -92.31585339, 0), x_dir=(0, -0.9996219169112966, -0.027495876610585536), z_dir=(1, 0, 0))) as chamfer1_piece_37a_section:
        Polygon((CHAMFER1_SIZE * 0.999621916911, -CHAMFER1_SIZE * 0.0274958766106), (-CHAMFER1_SIZE * 0.0274958766106, -CHAMFER1_SIZE * 0.999621916911), (0, 0), align=None)
    chamfer1_piece_37a = extrude(amount=9.15734639, mode=Mode.PRIVATE)
    chamfer1_piece_37a = split(chamfer1_piece_37a, bisect_by=Plane(origin=(82.389922843, -92.44777084, 0.131917451), z_dir=(-1, 0, 0)), keep=Keep.TOP, mode=Mode.PRIVATE)
    with BuildSketch(Plane(origin=(82.389922843, -89.787180195, 0), x_dir=(-0.9996219169112966, 0, -0.027495876610585536), z_dir=(0, -1, 0))) as chamfer1_piece_37b_section:
        Polygon((CHAMFER1_SIZE * 0.999621916911, -CHAMFER1_SIZE * 0.0274958766106), (-CHAMFER1_SIZE * 0.0274958766106, -CHAMFER1_SIZE * 0.999621916911), (0, 0), align=None)
    chamfer1_piece_37b = extrude(amount=3.55734639, mode=Mode.PRIVATE)
    chamfer1_piece_37b = split(chamfer1_piece_37b, bisect_by=Plane(origin=(82.258005392, -92.31585339, 0.131917451), z_dir=(0, -1, 0)), keep=Keep.TOP, mode=Mode.PRIVATE)
    chamfer1_piece_37 = chamfer1_piece_37a & chamfer1_piece_37b
    add(chamfer1_piece_37, mode=Mode.SUBTRACT)
    with BuildSketch(Plane(origin=(81.361249648, -92.31585339, 15), x_dir=(0, -0.9996219169112966, 0.02749587661058671), z_dir=(1, 0, 0))) as chamfer1_piece_38a_section:
        Polygon((CHAMFER1_SIZE * 0.999621916911, CHAMFER1_SIZE * 0.0274958766106), (-CHAMFER1_SIZE * 0.0274958766106, CHAMFER1_SIZE * 0.999621916911), (0, 0), align=None)
    chamfer1_piece_38a = extrude(amount=9.15734639, mode=Mode.PRIVATE)
    chamfer1_piece_38a = split(chamfer1_piece_38a, bisect_by=Plane(origin=(82.389922843, -92.44777084, 14.868082549), z_dir=(-1, 0, 0)), keep=Keep.TOP, mode=Mode.PRIVATE)
    with BuildSketch(Plane(origin=(82.389922843, -89.787180195, 15), x_dir=(-0.9996219169112966, 0, 0.02749587661058671), z_dir=(0, -1, 0))) as chamfer1_piece_38b_section:
        Polygon((CHAMFER1_SIZE * 0.999621916911, CHAMFER1_SIZE * 0.0274958766106), (-CHAMFER1_SIZE * 0.0274958766106, CHAMFER1_SIZE * 0.999621916911), (0, 0), align=None)
    chamfer1_piece_38b = extrude(amount=3.55734639, mode=Mode.PRIVATE)
    chamfer1_piece_38b = split(chamfer1_piece_38b, bisect_by=Plane(origin=(82.258005392, -92.31585339, 14.868082549), z_dir=(0, -1, 0)), keep=Keep.TOP, mode=Mode.PRIVATE)
    chamfer1_piece_38 = chamfer1_piece_38a & chamfer1_piece_38b
    add(chamfer1_piece_38, mode=Mode.SUBTRACT)
    with BuildSketch(Plane(origin=(69.489922843, -92.31585339, 15), x_dir=(0, -0.9996219169112966, 0.02749587661058671), z_dir=(1, 0, 0))) as chamfer1_piece_39a_section:
        Polygon((CHAMFER1_SIZE * 0.999621916911, CHAMFER1_SIZE * 0.0274958766106), (-CHAMFER1_SIZE * 0.0274958766106, CHAMFER1_SIZE * 0.999621916911), (0, 0), align=None)
    chamfer1_piece_39a = extrude(amount=8.128673195, mode=Mode.PRIVATE)
    chamfer1_piece_39a = split(chamfer1_piece_39a, bisect_by=Plane(origin=(76.589922843, -92.44777084, 14.868082549), z_dir=(1, 0, 0)), keep=Keep.TOP, mode=Mode.PRIVATE)
    with BuildSketch(Plane(origin=(76.589922843, -93.344526585, 15), x_dir=(0.9996219169112966, 0, 0.02749587661058671), z_dir=(0, 1, 0))) as chamfer1_piece_39b_section:
        Polygon((CHAMFER1_SIZE * 0.999621916911, CHAMFER1_SIZE * 0.0274958766106), (-CHAMFER1_SIZE * 0.0274958766106, CHAMFER1_SIZE * 0.999621916911), (0, 0), align=None)
    chamfer1_piece_39b = extrude(amount=3.55734639, mode=Mode.PRIVATE)
    chamfer1_piece_39b = split(chamfer1_piece_39b, bisect_by=Plane(origin=(76.721840294, -92.31585339, 14.868082549), z_dir=(0, -1, 0)), keep=Keep.TOP, mode=Mode.PRIVATE)
    chamfer1_piece_39 = chamfer1_piece_39a & chamfer1_piece_39b
    add(chamfer1_piece_39, mode=Mode.SUBTRACT)
    with BuildSketch(Plane(origin=(69.489922843, -85.21585339, 15), x_dir=(-0.9996219169112966, -2.1408261351483406e-13, 0.02749587661058671), z_dir=(0, -1, 0))) as chamfer1_piece_40a_section:
        Polygon((CHAMFER1_SIZE * 0.999621916911, CHAMFER1_SIZE * 0.0274958766106), (-CHAMFER1_SIZE * 0.0274958766106, CHAMFER1_SIZE * 0.999621916911), (0, 0), align=None)
    chamfer1_piece_40a = extrude(amount=8.128673195, mode=Mode.PRIVATE)
    chamfer1_piece_40a = split(chamfer1_piece_40a, bisect_by=Plane(origin=(69.358005392, -92.31585339, 14.868082549), z_dir=(0, -1, 0)), keep=Keep.TOP, mode=Mode.PRIVATE)
    with BuildSketch(Plane(origin=(68.461249648, -92.31585339, 15), x_dir=(0, -0.9996219169112966, 0.02749587661058671), z_dir=(1, 0, 0))) as chamfer1_piece_40b_section:
        Polygon((CHAMFER1_SIZE * 0.999621916911, CHAMFER1_SIZE * 0.0274958766106), (-CHAMFER1_SIZE * 0.0274958766106, CHAMFER1_SIZE * 0.999621916911), (0, 0), align=None)
    chamfer1_piece_40b = extrude(amount=8.128673195, mode=Mode.PRIVATE)
    chamfer1_piece_40b = split(chamfer1_piece_40b, bisect_by=Plane(origin=(69.489922843, -92.44777084, 14.868082549), z_dir=(-1, 0, 0)), keep=Keep.TOP, mode=Mode.PRIVATE)
    chamfer1_piece_40 = chamfer1_piece_40a & chamfer1_piece_40b
    add(chamfer1_piece_40, mode=Mode.SUBTRACT)
    with BuildSketch(Plane(origin=(72.018596038, -85.21585339, 15), x_dir=(0, 0.9996219169112966, 0.02749587661058671), z_dir=(-1, 0, 0))) as chamfer1_piece_41a_section:
        Polygon((CHAMFER1_SIZE * 0.999621916911, CHAMFER1_SIZE * 0.0274958766106), (-CHAMFER1_SIZE * 0.0274958766106, CHAMFER1_SIZE * 0.999621916911), (0, 0), align=None)
    chamfer1_piece_41a = extrude(amount=3.55734639, mode=Mode.PRIVATE)
    chamfer1_piece_41a = split(chamfer1_piece_41a, bisect_by=Plane(origin=(69.489922843, -85.083935939, 14.868082549), z_dir=(-1, 0, 0)), keep=Keep.TOP, mode=Mode.PRIVATE)
    with BuildSketch(Plane(origin=(69.489922843, -84.187180195, 15), x_dir=(-0.9996219169112966, -2.1408261351483406e-13, 0.02749587661058671), z_dir=(0, -1, 0))) as chamfer1_piece_41b_section:
        Polygon((CHAMFER1_SIZE * 0.999621916911, CHAMFER1_SIZE * 0.0274958766106), (-CHAMFER1_SIZE * 0.0274958766106, CHAMFER1_SIZE * 0.999621916911), (0, 0), align=None)
    chamfer1_piece_41b = extrude(amount=8.128673195, mode=Mode.PRIVATE)
    chamfer1_piece_41b = split(chamfer1_piece_41b, bisect_by=Plane(origin=(69.358005392, -85.21585339, 14.868082549), z_dir=(0, 1, 0)), keep=Keep.TOP, mode=Mode.PRIVATE)
    chamfer1_piece_41 = chamfer1_piece_41a & chamfer1_piece_41b
    add(chamfer1_piece_41, mode=Mode.SUBTRACT)
    with BuildSketch(Plane(origin=(69.489922843, -75.31575339, 15), x_dir=(-0.9996219169112966, 2.140826135148345e-13, 0.02749587661058671), z_dir=(0, -1, 0))) as chamfer1_piece_42a_section:
        Polygon((CHAMFER1_SIZE * 0.999621916911, CHAMFER1_SIZE * 0.0274958766106), (-CHAMFER1_SIZE * 0.0274958766106, CHAMFER1_SIZE * 0.999621916911), (0, 0), align=None)
    chamfer1_piece_42a = extrude(amount=5.128773195, mode=Mode.PRIVATE)
    chamfer1_piece_42a = split(chamfer1_piece_42a, bisect_by=Plane(origin=(69.358005392, -79.41585339, 14.868082549), z_dir=(0, -1, 0)), keep=Keep.TOP, mode=Mode.PRIVATE)
    with BuildSketch(Plane(origin=(68.461249648, -79.41585339, 15), x_dir=(0, -0.9996219169112966, 0.02749587661058671), z_dir=(1, 0, 0))) as chamfer1_piece_42b_section:
        Polygon((CHAMFER1_SIZE * 0.999621916911, CHAMFER1_SIZE * 0.0274958766106), (-CHAMFER1_SIZE * 0.0274958766106, CHAMFER1_SIZE * 0.999621916911), (0, 0), align=None)
    chamfer1_piece_42b = extrude(amount=3.55734639, mode=Mode.PRIVATE)
    chamfer1_piece_42b = split(chamfer1_piece_42b, bisect_by=Plane(origin=(69.489922843, -79.54777084, 14.868082549), z_dir=(-1, 0, 0)), keep=Keep.TOP, mode=Mode.PRIVATE)
    chamfer1_piece_42 = chamfer1_piece_42a & chamfer1_piece_42b
    add(chamfer1_piece_42, mode=Mode.SUBTRACT)


solid = part.part
